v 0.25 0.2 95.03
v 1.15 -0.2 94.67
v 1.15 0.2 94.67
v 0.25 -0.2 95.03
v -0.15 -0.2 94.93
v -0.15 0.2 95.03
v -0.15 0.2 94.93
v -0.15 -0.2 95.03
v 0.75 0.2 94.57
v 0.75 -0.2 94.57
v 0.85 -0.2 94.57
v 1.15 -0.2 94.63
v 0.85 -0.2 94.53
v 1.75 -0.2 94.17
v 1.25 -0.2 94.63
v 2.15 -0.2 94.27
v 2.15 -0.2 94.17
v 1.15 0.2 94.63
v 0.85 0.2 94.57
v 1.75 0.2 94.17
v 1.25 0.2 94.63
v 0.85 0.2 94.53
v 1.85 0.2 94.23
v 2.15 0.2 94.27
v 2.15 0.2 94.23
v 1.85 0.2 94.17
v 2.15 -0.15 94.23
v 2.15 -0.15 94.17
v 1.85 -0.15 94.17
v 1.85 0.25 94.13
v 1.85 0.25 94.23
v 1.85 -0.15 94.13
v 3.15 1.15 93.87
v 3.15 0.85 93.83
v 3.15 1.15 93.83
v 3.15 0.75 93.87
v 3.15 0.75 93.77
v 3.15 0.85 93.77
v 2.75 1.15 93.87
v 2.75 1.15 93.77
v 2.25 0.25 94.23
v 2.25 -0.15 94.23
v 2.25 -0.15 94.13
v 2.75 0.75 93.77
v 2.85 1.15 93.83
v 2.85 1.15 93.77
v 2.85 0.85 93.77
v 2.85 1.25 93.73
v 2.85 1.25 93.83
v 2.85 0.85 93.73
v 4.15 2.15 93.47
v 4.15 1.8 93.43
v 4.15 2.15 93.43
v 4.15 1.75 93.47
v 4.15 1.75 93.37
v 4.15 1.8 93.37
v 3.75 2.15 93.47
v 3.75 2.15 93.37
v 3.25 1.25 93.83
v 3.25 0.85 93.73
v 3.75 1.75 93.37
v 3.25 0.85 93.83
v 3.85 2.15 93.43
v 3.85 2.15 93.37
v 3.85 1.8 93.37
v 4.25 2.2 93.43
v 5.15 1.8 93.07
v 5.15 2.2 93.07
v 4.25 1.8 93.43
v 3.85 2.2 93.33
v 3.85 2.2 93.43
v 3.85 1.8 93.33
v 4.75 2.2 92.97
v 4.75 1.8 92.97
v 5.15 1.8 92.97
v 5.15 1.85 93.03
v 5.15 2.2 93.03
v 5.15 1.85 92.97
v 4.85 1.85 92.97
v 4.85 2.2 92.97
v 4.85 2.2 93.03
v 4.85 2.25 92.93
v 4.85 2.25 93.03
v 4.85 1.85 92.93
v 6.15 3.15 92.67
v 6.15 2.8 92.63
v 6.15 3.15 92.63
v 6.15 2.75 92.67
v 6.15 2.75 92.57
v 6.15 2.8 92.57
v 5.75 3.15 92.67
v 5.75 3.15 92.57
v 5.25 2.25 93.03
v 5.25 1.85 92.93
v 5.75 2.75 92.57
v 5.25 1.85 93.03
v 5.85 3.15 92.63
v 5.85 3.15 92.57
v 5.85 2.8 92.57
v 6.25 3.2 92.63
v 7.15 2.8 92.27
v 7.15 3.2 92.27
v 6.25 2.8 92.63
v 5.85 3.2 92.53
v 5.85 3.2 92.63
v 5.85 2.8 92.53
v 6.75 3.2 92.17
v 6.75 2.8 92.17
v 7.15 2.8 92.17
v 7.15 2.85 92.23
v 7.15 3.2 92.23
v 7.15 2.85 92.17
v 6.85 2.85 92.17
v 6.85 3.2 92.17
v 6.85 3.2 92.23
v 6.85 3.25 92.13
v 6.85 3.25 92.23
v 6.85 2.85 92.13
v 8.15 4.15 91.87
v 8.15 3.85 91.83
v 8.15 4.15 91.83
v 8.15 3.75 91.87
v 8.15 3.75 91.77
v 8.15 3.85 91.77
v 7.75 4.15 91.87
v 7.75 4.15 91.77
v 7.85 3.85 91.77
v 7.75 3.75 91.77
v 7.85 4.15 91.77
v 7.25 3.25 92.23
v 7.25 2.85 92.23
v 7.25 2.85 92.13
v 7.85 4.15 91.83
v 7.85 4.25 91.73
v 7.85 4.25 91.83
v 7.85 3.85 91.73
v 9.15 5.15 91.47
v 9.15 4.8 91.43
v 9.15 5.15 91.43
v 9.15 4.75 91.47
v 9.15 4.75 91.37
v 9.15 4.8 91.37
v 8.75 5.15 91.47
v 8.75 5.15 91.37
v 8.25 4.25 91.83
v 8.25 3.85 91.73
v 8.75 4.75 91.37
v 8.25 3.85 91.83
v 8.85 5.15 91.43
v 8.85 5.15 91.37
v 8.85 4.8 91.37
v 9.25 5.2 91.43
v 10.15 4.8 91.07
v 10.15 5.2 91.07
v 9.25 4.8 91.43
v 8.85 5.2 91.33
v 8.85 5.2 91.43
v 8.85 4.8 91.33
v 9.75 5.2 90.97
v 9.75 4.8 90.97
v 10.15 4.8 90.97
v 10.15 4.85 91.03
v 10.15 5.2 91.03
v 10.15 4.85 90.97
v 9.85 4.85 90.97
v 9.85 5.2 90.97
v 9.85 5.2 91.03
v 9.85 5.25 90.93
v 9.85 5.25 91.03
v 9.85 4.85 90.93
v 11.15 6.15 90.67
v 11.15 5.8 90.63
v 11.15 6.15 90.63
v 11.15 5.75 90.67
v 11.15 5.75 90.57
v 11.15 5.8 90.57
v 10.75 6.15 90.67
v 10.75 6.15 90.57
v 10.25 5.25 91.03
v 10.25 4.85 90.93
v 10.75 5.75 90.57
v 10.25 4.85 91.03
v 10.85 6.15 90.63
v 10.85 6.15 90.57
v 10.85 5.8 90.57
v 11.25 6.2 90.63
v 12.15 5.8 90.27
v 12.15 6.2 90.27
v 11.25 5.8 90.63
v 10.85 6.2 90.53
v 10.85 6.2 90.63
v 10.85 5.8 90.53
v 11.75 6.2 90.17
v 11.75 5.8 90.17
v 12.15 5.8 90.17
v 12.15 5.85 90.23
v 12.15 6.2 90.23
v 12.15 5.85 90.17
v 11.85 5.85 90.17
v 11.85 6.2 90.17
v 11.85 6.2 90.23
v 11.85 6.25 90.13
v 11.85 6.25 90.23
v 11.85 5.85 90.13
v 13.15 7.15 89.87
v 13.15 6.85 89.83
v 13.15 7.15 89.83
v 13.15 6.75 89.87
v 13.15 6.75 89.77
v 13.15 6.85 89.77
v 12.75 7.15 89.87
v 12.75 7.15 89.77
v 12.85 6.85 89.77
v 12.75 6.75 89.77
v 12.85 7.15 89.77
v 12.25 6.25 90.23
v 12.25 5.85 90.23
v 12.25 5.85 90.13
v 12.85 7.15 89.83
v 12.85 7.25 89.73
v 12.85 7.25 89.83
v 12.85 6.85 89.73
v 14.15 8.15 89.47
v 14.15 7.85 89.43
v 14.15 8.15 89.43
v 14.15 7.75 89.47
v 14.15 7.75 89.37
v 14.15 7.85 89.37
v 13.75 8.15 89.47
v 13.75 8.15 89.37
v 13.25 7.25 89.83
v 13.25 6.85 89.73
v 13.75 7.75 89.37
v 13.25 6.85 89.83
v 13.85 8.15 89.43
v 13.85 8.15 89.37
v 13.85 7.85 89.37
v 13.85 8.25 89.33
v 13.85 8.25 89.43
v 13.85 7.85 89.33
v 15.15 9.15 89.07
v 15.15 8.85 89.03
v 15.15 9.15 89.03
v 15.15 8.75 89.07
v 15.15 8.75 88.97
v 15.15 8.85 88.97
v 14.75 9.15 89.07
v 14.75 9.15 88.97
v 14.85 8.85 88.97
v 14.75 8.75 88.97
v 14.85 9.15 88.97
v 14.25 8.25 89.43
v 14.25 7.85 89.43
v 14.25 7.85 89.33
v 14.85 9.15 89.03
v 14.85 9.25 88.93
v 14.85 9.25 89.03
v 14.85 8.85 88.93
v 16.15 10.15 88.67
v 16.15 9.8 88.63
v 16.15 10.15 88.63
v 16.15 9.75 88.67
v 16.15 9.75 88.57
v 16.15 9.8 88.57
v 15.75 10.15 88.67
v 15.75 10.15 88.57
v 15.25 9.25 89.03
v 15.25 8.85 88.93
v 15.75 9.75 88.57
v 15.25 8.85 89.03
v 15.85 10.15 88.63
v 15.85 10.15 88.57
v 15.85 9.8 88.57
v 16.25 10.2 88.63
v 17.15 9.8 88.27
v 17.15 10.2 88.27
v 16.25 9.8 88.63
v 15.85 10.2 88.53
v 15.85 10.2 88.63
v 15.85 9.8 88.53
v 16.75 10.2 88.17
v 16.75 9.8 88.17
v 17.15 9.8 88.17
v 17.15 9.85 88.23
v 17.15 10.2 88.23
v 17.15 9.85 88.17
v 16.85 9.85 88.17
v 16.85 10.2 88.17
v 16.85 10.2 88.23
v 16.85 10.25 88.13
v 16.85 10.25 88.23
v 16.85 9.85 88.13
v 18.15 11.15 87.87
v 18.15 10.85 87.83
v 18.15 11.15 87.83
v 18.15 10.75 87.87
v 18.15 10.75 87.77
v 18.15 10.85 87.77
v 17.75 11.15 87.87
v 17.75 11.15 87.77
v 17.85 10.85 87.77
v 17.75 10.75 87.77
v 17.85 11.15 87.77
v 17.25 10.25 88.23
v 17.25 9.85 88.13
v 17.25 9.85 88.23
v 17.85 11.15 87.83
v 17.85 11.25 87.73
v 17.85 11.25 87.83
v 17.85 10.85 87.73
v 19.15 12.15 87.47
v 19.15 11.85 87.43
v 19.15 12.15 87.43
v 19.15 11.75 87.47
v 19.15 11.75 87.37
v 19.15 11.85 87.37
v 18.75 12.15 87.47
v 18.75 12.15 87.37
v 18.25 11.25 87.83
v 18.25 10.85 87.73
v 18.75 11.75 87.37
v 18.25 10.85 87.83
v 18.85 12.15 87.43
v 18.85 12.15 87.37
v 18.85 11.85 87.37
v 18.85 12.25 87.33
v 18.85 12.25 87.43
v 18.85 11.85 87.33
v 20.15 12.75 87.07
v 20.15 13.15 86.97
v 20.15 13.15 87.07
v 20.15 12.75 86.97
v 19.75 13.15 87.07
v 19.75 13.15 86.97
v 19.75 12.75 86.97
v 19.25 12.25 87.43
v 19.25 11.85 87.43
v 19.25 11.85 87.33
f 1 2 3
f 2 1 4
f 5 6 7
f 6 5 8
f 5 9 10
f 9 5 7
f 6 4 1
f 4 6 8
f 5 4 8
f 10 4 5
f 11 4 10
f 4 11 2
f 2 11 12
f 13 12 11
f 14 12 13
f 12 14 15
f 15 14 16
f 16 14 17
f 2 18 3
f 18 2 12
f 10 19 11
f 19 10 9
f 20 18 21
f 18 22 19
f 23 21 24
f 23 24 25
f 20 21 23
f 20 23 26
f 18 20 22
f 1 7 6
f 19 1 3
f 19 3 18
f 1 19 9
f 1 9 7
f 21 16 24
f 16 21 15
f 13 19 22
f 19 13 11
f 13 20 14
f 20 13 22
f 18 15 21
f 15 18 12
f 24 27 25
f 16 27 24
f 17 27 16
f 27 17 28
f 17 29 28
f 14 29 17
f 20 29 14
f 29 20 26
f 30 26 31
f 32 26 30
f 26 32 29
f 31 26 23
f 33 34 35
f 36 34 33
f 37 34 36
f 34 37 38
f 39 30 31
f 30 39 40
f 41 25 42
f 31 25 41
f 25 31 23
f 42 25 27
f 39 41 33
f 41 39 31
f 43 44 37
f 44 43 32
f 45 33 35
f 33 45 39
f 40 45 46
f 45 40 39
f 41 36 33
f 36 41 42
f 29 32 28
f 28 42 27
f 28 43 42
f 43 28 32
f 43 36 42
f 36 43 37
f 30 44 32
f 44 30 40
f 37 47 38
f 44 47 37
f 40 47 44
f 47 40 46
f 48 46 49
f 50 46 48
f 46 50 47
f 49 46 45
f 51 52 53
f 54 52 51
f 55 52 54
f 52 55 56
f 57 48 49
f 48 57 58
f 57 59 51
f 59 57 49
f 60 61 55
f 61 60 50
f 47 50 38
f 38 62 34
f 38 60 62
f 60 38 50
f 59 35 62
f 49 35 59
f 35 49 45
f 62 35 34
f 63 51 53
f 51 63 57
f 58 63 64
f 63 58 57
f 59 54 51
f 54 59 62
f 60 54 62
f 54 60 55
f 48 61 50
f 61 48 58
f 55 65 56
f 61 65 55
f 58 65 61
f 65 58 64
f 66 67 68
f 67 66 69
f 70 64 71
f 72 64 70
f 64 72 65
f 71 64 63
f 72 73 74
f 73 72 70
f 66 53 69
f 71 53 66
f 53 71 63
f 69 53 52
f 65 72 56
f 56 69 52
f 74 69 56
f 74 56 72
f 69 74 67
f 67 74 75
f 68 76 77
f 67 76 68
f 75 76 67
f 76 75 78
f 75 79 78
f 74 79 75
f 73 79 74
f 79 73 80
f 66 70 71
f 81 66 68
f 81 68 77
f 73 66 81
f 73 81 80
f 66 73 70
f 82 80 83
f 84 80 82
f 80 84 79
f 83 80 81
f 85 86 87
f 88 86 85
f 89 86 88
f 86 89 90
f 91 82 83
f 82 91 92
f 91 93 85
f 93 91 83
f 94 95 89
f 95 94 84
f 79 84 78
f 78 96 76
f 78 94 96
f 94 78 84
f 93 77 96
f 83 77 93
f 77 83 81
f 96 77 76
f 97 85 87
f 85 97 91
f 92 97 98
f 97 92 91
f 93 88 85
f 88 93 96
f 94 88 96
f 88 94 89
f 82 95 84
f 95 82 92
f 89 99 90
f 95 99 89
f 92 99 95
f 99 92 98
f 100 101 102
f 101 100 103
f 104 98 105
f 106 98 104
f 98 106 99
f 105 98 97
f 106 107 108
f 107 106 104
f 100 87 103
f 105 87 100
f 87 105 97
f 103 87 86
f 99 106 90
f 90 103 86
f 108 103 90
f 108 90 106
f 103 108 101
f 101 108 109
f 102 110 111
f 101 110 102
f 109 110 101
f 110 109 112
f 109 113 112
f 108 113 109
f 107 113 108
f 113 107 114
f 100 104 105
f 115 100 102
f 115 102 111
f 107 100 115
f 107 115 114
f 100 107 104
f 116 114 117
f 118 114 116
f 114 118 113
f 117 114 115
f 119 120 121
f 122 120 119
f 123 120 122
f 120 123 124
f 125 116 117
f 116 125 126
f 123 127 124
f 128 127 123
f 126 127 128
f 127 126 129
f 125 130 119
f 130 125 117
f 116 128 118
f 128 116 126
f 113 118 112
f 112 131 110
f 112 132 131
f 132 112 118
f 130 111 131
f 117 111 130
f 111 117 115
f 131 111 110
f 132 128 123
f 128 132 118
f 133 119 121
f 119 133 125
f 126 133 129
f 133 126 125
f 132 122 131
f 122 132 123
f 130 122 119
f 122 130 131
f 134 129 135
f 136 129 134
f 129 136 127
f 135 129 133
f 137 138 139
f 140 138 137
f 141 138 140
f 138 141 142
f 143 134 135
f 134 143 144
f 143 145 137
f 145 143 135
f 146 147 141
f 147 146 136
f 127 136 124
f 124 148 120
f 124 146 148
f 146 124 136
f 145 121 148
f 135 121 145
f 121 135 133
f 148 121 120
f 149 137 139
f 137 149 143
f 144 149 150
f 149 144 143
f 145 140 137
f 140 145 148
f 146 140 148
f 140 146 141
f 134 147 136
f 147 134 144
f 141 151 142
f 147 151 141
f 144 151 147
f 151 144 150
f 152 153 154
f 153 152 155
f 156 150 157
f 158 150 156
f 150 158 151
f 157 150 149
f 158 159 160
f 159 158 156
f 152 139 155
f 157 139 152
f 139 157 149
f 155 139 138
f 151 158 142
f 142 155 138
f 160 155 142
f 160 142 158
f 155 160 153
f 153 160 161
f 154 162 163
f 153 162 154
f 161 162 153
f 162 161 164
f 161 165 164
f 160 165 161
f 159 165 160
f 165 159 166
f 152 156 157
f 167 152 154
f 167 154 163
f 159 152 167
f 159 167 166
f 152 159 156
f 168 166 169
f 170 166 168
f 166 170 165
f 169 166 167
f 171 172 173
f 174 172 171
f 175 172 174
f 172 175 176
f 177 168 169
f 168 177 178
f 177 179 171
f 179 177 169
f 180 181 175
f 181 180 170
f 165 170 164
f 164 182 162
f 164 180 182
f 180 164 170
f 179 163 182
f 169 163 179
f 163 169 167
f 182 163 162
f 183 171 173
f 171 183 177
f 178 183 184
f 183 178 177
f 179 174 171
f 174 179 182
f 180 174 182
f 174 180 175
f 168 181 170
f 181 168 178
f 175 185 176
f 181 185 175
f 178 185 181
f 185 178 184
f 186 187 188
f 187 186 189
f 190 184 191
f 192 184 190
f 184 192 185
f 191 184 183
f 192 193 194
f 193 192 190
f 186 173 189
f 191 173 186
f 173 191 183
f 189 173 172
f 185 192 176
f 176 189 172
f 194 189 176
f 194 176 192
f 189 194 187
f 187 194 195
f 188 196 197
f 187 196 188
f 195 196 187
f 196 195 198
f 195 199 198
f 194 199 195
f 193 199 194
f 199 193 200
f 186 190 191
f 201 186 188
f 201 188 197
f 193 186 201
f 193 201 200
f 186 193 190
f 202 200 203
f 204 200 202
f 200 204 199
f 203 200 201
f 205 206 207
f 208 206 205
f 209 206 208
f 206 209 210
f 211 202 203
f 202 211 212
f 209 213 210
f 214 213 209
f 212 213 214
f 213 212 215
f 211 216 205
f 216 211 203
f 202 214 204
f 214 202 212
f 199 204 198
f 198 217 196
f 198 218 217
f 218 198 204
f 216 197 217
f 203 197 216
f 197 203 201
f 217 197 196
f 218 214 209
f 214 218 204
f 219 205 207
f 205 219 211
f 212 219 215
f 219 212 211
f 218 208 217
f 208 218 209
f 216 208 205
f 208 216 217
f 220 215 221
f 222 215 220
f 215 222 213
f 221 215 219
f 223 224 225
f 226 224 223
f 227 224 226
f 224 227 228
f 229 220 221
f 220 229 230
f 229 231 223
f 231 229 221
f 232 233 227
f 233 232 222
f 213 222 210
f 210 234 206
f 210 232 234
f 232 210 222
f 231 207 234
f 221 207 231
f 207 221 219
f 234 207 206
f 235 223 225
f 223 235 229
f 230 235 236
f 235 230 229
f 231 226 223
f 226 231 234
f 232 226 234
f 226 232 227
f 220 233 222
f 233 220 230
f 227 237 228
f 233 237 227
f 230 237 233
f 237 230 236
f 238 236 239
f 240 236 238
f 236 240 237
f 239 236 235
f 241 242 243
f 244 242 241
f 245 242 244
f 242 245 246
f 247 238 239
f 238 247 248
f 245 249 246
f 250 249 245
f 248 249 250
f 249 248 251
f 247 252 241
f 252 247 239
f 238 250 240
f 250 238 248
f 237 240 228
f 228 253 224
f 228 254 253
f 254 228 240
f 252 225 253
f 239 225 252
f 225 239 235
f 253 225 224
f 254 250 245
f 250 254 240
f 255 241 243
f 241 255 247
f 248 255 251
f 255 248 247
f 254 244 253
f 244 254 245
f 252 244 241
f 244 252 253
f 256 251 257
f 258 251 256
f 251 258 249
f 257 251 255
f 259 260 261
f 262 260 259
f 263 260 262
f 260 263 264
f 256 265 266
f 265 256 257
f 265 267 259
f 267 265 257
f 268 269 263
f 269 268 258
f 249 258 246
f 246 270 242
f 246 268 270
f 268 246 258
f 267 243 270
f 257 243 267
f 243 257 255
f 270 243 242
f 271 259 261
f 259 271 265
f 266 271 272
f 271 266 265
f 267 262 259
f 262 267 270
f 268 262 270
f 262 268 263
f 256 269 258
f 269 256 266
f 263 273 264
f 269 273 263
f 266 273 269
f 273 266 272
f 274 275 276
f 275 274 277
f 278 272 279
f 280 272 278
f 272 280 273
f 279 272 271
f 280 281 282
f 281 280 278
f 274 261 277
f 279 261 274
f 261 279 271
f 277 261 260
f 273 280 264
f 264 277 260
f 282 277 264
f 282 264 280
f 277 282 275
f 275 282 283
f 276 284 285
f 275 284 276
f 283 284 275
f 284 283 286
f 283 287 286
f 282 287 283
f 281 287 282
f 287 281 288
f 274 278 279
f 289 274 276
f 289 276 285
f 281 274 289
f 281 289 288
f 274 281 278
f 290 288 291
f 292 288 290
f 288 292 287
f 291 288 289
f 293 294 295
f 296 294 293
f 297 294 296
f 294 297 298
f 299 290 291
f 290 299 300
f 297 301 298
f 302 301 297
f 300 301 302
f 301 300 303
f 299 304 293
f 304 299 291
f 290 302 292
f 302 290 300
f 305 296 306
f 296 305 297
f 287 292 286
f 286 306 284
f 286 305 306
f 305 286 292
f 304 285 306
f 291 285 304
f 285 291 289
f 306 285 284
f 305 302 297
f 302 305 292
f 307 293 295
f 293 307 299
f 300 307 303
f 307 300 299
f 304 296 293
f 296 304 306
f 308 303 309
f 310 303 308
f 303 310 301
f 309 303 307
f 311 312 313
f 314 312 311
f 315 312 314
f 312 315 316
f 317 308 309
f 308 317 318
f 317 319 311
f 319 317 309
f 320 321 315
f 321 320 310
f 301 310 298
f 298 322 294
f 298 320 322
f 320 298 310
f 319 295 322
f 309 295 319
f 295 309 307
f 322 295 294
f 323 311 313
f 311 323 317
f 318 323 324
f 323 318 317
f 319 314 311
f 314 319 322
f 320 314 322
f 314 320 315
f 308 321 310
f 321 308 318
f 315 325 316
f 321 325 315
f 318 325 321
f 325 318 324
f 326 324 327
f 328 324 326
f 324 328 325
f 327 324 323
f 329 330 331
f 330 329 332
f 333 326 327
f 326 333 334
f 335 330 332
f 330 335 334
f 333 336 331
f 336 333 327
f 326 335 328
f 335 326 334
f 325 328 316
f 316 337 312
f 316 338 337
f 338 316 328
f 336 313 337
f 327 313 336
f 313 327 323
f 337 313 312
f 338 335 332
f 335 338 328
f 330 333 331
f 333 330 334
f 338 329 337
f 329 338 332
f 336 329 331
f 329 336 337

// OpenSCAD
hull() {
    translate([0.05, 0.0, 94.98]) cube([0.4, 0.4, 0.1], center=true);
    translate([0.9500000000000001, 0.0, 94.62]) cube([0.4, 0.4, 0.1], center=true);
}


hull() {
    translate([1.05, 0.0, 94.58]) cube([0.4, 0.4, 0.1], center=true);
    translate([1.9500000000000002, 0.0, 94.22]) cube([0.4, 0.4, 0.1], center=true);
}


hull() {
    translate([2.05, 0.05, 94.18]) cube([0.4, 0.4, 0.1], center=true);
    translate([2.95, 0.9500000000000001, 93.82000000000001]) cube([0.4, 0.4, 0.1], center=true);
}


hull() {
    translate([3.0500000000000003, 1.05, 93.78]) cube([0.4, 0.4, 0.1], center=true);
    translate([3.95, 1.9500000000000002, 93.42]) cube([0.4, 0.4, 0.1], center=true);
}


hull() {
    translate([4.05, 2.0, 93.38]) cube([0.4, 0.4, 0.1], center=true);
    translate([4.95, 2.0, 93.02000000000001]) cube([0.4, 0.4, 0.1], center=true);
}


hull() {
    translate([5.05, 2.05, 92.98]) cube([0.4, 0.4, 0.1], center=true);
    translate([5.95, 2.95, 92.62]) cube([0.4, 0.4, 0.1], center=true);
}


hull() {
    translate([6.050000000000001, 3.0, 92.58]) cube([0.4, 0.4, 0.1], center=true);
    translate([6.95, 3.0, 92.22]) cube([0.4, 0.4, 0.1], center=true);
}


hull() {
    translate([7.05, 3.0500000000000003, 92.18]) cube([0.4, 0.4, 0.1], center=true);
    translate([7.95, 3.95, 91.82000000000001]) cube([0.4, 0.4, 0.1], center=true);
}


hull() {
    translate([8.05, 4.05, 91.78]) cube([0.4, 0.4, 0.1], center=true);
    translate([8.95, 4.95, 91.42]) cube([0.4, 0.4, 0.1], center=true);
}


hull() {
    translate([9.049999999999999, 5.0, 91.38000000000001]) cube([0.4, 0.4, 0.1], center=true);
    translate([9.95, 5.0, 91.02000000000001]) cube([0.4, 0.4, 0.1], center=true);
}


hull() {
    translate([10.05, 5.05, 90.98]) cube([0.4, 0.4, 0.1], center=true);
    translate([10.950000000000001, 5.95, 90.61999999999999]) cube([0.4, 0.4, 0.1], center=true);
}


hull() {
    translate([11.05, 6.0, 90.58]) cube([0.4, 0.4, 0.1], center=true);
    translate([11.950000000000001, 6.0, 90.22000000000001]) cube([0.4, 0.4, 0.1], center=true);
}


hull() {
    translate([12.05, 6.050000000000001, 90.18]) cube([0.4, 0.4, 0.1], center=true);
    translate([12.950000000000001, 6.95, 89.82]) cube([0.4, 0.4, 0.1], center=true);
}


hull() {
    translate([13.05, 7.05, 89.77999999999999]) cube([0.4, 0.4, 0.1], center=true);
    translate([13.95, 7.95, 89.42]) cube([0.4, 0.4, 0.1], center=true);
}


hull() {
    translate([14.05, 8.05, 89.38000000000001]) cube([0.4, 0.4, 0.1], center=true);
    translate([14.95, 8.95, 89.02000000000001]) cube([0.4, 0.4, 0.1], center=true);
}


hull() {
    translate([15.05, 9.049999999999999, 88.98]) cube([0.4, 0.4, 0.1], center=true);
    translate([15.950000000000001, 9.95, 88.61999999999999]) cube([0.4, 0.4, 0.1], center=true);
}


hull() {
    translate([16.05, 10.0, 88.58]) cube([0.4, 0.4, 0.1], center=true);
    translate([16.95, 10.0, 88.22000000000001]) cube([0.4, 0.4, 0.1], center=true);
}


hull() {
    translate([17.05, 10.05, 88.18]) cube([0.4, 0.4, 0.1], center=true);
    translate([17.95, 10.950000000000001, 87.82]) cube([0.4, 0.4, 0.1], center=true);
}


hull() {
    translate([18.05, 11.05, 87.78]) cube([0.4, 0.4, 0.1], center=true);
    translate([18.950000000000003, 11.950000000000001, 87.42000000000002]) cube([0.4, 0.4, 0.1], center=true);
}


hull() {
    translate([19.05, 12.05, 87.38000000000001]) cube([0.4, 0.4, 0.1], center=true);
    translate([19.95, 12.950000000000001, 87.02]) cube([0.4, 0.4, 0.1], center=true);
}
